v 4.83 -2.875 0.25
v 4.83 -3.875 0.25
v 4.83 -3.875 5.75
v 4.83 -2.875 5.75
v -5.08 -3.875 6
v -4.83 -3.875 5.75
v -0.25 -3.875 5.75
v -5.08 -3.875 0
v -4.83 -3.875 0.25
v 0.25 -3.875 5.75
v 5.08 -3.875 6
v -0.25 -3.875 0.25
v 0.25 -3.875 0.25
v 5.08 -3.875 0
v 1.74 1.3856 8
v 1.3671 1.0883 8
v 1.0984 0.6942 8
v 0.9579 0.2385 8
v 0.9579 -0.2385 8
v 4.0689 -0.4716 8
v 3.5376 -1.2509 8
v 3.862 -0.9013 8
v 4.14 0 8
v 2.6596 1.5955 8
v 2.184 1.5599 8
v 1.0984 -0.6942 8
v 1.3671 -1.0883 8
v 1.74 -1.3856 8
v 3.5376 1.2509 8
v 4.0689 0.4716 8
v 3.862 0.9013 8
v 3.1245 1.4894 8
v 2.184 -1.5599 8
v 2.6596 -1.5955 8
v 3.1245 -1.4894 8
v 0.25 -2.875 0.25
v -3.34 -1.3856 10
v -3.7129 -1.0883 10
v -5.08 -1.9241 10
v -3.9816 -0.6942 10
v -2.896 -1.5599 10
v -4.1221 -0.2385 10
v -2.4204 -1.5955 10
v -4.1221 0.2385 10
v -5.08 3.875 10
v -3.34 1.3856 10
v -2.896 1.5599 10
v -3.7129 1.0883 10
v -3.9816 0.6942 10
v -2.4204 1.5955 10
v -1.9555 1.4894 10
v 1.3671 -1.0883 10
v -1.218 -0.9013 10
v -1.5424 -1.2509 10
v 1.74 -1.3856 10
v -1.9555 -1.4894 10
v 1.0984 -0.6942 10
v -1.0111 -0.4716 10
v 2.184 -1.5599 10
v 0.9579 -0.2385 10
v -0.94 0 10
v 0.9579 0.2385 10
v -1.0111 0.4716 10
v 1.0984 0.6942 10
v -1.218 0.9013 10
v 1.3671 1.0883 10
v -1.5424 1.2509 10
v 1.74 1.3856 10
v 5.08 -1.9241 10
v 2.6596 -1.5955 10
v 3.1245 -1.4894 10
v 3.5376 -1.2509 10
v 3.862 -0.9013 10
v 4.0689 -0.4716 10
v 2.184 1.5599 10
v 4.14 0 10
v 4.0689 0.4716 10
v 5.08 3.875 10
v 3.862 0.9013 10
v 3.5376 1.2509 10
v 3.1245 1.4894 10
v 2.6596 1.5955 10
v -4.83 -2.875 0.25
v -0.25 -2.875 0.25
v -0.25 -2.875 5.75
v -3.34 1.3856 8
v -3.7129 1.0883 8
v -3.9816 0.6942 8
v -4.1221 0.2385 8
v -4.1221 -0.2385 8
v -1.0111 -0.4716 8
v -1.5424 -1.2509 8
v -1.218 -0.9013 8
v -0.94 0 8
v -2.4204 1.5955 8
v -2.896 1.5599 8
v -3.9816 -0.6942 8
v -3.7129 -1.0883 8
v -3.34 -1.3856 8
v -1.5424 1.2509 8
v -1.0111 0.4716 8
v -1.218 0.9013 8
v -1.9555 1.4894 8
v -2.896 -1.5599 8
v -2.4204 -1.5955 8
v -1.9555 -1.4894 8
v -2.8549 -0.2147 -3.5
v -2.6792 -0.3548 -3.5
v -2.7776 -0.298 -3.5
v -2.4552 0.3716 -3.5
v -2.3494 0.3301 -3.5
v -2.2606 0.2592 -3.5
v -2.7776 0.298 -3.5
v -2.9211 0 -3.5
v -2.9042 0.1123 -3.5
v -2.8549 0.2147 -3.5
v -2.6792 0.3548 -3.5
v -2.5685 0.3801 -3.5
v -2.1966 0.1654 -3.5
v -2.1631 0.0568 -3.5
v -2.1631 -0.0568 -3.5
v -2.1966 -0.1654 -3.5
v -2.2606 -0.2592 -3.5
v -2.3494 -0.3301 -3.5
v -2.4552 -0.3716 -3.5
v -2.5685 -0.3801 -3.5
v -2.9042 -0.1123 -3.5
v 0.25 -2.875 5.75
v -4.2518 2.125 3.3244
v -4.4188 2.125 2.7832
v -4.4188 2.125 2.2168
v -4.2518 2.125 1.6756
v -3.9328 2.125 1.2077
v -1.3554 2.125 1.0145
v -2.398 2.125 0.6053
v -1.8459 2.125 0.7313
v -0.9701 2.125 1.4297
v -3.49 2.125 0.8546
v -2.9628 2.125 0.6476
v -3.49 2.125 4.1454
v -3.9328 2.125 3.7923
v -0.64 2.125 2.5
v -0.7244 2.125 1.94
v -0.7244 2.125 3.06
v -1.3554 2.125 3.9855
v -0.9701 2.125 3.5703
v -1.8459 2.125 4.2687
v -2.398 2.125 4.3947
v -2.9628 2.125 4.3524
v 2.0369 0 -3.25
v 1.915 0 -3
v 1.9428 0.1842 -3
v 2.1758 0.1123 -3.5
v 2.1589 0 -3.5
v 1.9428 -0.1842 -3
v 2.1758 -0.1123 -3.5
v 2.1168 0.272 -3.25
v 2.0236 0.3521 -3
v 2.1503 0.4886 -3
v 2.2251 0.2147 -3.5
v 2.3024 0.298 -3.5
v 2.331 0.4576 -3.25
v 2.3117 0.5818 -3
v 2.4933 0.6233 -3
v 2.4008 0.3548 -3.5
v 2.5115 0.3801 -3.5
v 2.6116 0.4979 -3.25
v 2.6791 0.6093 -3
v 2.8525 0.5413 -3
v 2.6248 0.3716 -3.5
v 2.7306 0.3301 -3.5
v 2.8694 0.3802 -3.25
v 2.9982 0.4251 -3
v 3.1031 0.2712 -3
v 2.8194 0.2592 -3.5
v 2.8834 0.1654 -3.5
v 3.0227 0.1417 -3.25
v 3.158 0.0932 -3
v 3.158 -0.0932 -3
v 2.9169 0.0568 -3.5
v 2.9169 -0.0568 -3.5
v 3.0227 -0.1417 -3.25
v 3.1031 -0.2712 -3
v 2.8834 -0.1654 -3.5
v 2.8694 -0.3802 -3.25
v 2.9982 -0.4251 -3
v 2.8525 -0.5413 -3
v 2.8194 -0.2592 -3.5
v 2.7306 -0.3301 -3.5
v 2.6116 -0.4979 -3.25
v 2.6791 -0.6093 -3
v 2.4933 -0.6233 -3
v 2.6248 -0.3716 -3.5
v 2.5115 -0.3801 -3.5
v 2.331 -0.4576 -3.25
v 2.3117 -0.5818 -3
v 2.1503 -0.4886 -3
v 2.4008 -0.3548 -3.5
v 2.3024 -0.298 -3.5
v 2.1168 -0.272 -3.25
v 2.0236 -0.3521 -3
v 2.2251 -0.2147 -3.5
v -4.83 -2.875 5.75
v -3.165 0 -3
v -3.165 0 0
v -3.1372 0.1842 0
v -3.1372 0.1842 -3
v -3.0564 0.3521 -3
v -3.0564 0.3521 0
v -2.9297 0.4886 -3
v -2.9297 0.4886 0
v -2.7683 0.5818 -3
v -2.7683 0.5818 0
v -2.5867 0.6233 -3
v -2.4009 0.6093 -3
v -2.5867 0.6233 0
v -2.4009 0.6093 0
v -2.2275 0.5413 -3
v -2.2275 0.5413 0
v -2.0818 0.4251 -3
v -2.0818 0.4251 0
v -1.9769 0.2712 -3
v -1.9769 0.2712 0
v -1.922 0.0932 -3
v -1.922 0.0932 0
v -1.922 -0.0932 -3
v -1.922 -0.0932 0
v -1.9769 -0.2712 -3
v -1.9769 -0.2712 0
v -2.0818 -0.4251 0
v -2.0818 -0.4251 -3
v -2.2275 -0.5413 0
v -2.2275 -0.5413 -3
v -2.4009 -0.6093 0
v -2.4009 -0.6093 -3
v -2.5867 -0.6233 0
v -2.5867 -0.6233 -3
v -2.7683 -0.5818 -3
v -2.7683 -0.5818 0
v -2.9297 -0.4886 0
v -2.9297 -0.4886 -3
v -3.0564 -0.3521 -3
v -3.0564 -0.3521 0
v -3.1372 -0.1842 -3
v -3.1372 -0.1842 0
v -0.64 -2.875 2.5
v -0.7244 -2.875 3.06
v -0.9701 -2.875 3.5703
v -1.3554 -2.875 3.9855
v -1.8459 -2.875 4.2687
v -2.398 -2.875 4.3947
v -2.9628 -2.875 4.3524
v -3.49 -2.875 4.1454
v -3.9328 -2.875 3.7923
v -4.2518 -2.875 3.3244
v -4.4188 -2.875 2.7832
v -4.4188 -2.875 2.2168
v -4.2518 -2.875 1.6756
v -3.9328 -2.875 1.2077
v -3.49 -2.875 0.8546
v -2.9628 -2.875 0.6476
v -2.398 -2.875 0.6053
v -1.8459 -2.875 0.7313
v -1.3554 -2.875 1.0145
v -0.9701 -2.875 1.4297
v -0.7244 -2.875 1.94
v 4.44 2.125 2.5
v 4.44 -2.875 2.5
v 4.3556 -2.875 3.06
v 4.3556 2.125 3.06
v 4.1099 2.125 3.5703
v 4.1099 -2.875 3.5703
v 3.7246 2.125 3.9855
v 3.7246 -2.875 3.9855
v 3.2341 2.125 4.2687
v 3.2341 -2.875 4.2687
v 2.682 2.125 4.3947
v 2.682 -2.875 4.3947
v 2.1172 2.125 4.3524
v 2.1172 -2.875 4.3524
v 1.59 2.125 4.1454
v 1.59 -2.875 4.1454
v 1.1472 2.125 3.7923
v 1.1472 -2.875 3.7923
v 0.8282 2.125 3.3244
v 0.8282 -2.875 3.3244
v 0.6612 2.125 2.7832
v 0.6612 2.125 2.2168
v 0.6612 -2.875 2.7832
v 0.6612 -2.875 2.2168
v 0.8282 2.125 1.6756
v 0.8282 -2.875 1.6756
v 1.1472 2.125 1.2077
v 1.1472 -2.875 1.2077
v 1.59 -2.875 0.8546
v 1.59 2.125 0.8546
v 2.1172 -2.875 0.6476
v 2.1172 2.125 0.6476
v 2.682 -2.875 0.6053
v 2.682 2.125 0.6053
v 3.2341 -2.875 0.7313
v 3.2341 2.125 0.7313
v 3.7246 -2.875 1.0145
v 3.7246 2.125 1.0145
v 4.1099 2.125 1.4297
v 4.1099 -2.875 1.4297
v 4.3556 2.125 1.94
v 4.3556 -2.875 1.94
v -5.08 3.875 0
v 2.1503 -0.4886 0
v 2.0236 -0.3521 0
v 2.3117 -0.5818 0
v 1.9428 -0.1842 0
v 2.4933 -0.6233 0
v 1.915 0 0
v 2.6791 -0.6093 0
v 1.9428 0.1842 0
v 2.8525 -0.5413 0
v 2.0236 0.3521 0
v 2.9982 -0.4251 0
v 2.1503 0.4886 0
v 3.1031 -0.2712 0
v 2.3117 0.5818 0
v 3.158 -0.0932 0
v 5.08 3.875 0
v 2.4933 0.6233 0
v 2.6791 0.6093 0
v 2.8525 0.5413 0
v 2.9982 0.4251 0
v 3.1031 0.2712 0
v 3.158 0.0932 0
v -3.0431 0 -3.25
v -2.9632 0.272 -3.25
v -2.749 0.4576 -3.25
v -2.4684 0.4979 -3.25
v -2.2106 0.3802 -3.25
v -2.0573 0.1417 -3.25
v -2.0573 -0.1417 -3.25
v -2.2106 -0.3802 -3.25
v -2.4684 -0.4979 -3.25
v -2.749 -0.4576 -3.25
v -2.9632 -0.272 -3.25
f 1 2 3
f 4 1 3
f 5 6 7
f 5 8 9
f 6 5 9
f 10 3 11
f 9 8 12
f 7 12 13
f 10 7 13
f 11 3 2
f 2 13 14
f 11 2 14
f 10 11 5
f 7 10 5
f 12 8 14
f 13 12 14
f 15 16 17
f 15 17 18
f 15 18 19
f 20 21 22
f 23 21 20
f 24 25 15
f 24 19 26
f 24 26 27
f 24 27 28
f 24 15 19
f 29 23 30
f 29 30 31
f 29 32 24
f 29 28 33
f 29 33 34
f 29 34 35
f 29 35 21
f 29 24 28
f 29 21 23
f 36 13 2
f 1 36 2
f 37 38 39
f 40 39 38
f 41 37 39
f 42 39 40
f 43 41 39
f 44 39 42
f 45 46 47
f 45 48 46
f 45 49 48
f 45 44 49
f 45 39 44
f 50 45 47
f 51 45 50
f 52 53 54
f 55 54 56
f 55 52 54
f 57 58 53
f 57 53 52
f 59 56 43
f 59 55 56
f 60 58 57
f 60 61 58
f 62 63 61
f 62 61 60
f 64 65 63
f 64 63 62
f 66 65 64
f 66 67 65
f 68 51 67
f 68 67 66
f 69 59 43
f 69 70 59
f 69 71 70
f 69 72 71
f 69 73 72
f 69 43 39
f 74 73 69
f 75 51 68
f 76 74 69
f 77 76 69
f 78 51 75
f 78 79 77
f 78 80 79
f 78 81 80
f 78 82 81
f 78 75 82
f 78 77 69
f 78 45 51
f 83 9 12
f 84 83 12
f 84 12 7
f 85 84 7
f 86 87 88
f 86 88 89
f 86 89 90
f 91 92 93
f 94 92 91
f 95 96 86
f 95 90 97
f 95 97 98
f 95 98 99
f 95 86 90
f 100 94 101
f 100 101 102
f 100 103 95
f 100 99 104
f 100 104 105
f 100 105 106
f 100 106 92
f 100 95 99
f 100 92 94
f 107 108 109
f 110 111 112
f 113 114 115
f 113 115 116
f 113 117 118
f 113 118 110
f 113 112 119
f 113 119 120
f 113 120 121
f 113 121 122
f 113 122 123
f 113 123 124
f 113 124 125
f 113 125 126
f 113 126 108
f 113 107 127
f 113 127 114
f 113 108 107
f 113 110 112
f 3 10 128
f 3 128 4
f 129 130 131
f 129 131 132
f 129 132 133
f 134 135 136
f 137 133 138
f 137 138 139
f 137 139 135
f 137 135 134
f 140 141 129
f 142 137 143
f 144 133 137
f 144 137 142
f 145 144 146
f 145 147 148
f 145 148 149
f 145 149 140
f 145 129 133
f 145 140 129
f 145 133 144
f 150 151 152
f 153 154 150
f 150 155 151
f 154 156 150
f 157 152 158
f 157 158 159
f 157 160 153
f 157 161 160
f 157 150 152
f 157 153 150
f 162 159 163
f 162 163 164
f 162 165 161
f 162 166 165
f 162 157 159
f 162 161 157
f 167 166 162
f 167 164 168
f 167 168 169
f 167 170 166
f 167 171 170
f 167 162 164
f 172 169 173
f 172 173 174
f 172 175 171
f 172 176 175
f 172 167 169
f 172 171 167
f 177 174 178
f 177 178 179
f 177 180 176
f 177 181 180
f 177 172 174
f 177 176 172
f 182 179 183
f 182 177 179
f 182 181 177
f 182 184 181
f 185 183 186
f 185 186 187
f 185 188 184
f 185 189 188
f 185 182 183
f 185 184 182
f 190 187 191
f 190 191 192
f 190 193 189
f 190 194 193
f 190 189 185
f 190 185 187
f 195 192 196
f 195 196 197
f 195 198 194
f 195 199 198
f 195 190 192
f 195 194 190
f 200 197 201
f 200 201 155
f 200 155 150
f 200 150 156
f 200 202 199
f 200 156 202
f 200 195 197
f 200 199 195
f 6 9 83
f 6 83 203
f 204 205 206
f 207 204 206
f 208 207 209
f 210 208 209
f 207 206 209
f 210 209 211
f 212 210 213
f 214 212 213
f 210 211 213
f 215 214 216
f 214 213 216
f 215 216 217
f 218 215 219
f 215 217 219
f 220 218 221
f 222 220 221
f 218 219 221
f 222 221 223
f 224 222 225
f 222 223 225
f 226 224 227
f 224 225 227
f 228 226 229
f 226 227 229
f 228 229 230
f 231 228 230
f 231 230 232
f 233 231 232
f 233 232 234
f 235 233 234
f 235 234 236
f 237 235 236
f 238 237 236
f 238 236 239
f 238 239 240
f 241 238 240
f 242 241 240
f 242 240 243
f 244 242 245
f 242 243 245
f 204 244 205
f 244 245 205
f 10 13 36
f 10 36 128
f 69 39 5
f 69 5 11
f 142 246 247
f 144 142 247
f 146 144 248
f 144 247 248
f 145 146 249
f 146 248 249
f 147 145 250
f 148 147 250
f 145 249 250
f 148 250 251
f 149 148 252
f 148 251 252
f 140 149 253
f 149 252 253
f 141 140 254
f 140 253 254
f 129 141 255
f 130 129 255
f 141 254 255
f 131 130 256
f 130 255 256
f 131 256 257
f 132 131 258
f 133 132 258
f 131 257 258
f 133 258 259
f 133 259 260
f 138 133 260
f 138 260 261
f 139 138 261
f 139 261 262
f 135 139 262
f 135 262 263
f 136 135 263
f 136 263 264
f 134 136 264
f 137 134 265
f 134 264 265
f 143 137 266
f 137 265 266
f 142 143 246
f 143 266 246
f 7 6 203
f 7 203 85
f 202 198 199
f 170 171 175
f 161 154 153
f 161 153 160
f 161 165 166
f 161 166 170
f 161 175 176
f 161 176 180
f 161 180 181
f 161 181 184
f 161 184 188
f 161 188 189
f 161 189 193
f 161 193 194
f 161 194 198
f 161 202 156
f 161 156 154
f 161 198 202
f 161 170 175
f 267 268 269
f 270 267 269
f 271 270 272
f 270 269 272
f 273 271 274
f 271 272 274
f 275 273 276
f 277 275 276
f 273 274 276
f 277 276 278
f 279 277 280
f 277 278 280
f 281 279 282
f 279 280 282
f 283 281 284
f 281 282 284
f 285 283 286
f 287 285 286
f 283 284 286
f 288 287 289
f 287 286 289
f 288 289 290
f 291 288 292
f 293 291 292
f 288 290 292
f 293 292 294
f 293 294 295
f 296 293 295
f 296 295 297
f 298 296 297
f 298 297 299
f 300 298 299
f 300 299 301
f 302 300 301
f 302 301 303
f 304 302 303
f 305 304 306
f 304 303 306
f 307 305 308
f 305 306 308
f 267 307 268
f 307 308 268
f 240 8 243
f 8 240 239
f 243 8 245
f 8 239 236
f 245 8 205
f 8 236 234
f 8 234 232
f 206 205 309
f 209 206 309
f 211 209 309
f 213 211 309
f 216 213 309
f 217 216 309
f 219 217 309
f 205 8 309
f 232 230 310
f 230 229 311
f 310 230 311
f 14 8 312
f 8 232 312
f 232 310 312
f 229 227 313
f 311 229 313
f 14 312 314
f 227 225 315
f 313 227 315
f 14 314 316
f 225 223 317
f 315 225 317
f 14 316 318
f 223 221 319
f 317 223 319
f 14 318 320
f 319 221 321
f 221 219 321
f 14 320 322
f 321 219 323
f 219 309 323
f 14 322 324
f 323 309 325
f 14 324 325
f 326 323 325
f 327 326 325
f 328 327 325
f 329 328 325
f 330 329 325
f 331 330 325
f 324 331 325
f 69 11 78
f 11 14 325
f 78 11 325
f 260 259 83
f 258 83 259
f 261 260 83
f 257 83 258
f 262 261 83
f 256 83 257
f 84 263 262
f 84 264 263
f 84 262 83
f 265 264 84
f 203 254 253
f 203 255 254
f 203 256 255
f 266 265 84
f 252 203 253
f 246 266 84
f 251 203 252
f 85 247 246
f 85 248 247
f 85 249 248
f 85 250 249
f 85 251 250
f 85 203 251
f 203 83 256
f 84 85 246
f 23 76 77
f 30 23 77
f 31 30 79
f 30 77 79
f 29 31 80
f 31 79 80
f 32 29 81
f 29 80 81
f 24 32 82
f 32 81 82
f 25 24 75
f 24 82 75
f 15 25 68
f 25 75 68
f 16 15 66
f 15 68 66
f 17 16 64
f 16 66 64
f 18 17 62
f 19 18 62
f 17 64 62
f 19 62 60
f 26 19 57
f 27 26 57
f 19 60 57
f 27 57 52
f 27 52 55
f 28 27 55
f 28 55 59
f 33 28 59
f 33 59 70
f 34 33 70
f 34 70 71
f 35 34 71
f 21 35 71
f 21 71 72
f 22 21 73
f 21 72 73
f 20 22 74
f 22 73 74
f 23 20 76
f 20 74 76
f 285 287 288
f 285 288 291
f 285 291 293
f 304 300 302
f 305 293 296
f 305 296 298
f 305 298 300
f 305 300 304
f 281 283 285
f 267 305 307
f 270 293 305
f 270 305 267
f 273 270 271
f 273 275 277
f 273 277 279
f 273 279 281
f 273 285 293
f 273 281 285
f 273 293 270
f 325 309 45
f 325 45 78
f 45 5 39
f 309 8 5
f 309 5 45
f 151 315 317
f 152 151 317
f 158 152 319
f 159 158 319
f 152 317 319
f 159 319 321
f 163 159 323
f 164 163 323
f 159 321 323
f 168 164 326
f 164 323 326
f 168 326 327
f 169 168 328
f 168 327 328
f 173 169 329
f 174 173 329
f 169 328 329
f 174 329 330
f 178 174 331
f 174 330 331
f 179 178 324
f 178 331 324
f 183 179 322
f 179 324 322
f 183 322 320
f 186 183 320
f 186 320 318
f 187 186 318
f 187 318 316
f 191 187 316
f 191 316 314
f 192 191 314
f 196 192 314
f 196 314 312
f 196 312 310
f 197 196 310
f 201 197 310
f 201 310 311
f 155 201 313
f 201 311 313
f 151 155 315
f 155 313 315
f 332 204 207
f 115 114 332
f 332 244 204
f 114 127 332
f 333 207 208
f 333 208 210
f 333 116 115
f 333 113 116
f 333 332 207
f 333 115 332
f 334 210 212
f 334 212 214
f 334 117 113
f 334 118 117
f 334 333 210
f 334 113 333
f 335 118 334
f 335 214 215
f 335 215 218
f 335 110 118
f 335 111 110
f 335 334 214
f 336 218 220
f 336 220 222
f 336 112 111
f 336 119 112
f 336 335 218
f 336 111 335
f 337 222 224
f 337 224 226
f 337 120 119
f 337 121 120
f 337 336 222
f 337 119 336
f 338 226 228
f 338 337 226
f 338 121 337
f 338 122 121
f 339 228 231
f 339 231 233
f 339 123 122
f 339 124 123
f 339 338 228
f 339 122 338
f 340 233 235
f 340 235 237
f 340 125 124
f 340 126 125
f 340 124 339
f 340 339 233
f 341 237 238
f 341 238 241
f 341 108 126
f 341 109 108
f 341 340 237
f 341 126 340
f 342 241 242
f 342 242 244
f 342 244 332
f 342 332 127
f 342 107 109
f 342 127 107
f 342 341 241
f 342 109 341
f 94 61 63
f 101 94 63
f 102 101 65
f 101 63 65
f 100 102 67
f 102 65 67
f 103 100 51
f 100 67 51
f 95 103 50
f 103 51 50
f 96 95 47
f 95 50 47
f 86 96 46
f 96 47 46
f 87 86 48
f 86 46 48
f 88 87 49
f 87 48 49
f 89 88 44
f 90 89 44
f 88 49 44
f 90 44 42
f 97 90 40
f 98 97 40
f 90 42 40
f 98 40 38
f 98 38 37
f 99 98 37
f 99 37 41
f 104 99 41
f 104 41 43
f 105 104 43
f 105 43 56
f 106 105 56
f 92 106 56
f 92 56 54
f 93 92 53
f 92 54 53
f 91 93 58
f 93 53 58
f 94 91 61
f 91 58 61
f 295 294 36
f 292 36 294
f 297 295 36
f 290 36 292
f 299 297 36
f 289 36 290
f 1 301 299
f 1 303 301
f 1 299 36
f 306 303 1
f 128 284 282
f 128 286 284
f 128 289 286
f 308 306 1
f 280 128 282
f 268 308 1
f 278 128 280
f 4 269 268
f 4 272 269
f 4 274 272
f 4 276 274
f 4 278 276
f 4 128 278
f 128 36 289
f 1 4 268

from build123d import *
from OCP.BRepFilletAPI import BRepFilletAPI_MakeChamfer

# Parameters (mm, degrees)
SKETCH1_W           = 10.16
SKETCH1_H           = 7.75
BOSS_EXTRUDE1_DEPTH = 10
CHAMFER1_SIZE       = 4
CHAMFER1_SIZE2      = 1.950930354
SKETCH2_R           = 1.6
CUT_EXTRUDE1_DEPTH  = 2
SKETCH3_W           = 4.58
SKETCH3_H           = 5.5
CUT_EXTRUDE2_DEPTH  = 1
SKETCH4_R           = 1.9
CUT_EXTRUDE3_DEPTH  = 5
SKETCH5_R           = 0.625
BOSS_EXTRUDE2_DEPTH = 3.5
CHAMFER2_SIZE       = 0.5
CHAMFER2_SIZE2      = 0.243866294


with BuildPart() as part:
    # Sketch1 → Boss-Extrude1 (new body)
    with BuildSketch(Plane.XY):
        Rectangle(SKETCH1_W, SKETCH1_H)
    extrude(amount=BOSS_EXTRUDE1_DEPTH)

    # Chamfer1
    chamfer1_edges = [part.edges().sort_by_distance(p)[0] for p in [
        (0, -3.875, 10),
    ]]
    chamfer1_side = [part.faces().sort_by_distance(p)[0] for p in [
        (0, -3.875, 5),
    ]]
    chamfer(chamfer1_edges, length=CHAMFER1_SIZE, length2=CHAMFER1_SIZE2, reference=chamfer1_side[0])

    # Sketch2 → Cut-Extrude1 (cut)
    with BuildSketch(Plane.XY.offset(10)):
        with Locations((-2.54, 0)):
            Circle(SKETCH2_R)
        with Locations((2.54, 0)):
            Circle(SKETCH2_R)
    extrude(amount=-CUT_EXTRUDE1_DEPTH, mode=Mode.SUBTRACT)

    # Sketch3 → Cut-Extrude2 (cut)
    with BuildSketch(Plane.XZ.offset(3.875)):
        with Locations((-2.54, 3)):
            Rectangle(SKETCH3_W, SKETCH3_H)
        with Locations((2.54, 3)):
            Rectangle(SKETCH3_W, SKETCH3_H)
    extrude(amount=-CUT_EXTRUDE2_DEPTH, mode=Mode.SUBTRACT)

    # Sketch4 → Cut-Extrude3 (cut)
    with BuildSketch(Plane.XZ.offset(2.875)):
        with Locations((-2.54, 2.5)):
            Circle(SKETCH4_R)
        with Locations((2.54, 2.5)):
            Circle(SKETCH4_R)
    extrude(amount=-CUT_EXTRUDE3_DEPTH, mode=Mode.SUBTRACT)

    # Sketch5 → Boss-Extrude2 (add)
    with BuildSketch(Plane(origin=(0, 0, 0), x_dir=(-1, 0, 0), z_dir=(0, 0, -1))):
        with Locations((2.54, 0)):
            Circle(SKETCH5_R)
        with Locations((-2.54, 0)):
            Circle(SKETCH5_R)
    extrude(amount=BOSS_EXTRUDE2_DEPTH)

    # Chamfer2: one chamfer whose edges measure the first distance from different faces: ONE call of the kernel's chamfer builder (chamfer() names one face for all edges)
    chamfer2_edges_1 = [part.edges().sort_by_distance(p)[0] for p in [
        (-1.915, 0, -3.5),
    ]]
    chamfer2_side_1 = [part.faces().sort_by_distance(p)[0] for p in [
        (-1.915, 0, -1.75),
    ]]
    chamfer2_edges_2 = [part.edges().sort_by_distance(p)[0] for p in [
        (3.165, 0, -3.5),
    ]]
    chamfer2_side_2 = [part.faces().sort_by_distance(p)[0] for p in [
        (3.165, 0, -1.75),
    ]]
    chamfer2 = BRepFilletAPI_MakeChamfer(part.part.solid().wrapped)
    for e in chamfer2_edges_1:
        chamfer2.Add(CHAMFER2_SIZE, CHAMFER2_SIZE2, e.wrapped, chamfer2_side_1[0].wrapped)  # the first distance lies on this face
    for e in chamfer2_edges_2:
        chamfer2.Add(CHAMFER2_SIZE, CHAMFER2_SIZE2, e.wrapped, chamfer2_side_2[0].wrapped)  # the first distance lies on this face
    add(Compound.cast(chamfer2.Shape()), mode=Mode.REPLACE)


solid = part.part
